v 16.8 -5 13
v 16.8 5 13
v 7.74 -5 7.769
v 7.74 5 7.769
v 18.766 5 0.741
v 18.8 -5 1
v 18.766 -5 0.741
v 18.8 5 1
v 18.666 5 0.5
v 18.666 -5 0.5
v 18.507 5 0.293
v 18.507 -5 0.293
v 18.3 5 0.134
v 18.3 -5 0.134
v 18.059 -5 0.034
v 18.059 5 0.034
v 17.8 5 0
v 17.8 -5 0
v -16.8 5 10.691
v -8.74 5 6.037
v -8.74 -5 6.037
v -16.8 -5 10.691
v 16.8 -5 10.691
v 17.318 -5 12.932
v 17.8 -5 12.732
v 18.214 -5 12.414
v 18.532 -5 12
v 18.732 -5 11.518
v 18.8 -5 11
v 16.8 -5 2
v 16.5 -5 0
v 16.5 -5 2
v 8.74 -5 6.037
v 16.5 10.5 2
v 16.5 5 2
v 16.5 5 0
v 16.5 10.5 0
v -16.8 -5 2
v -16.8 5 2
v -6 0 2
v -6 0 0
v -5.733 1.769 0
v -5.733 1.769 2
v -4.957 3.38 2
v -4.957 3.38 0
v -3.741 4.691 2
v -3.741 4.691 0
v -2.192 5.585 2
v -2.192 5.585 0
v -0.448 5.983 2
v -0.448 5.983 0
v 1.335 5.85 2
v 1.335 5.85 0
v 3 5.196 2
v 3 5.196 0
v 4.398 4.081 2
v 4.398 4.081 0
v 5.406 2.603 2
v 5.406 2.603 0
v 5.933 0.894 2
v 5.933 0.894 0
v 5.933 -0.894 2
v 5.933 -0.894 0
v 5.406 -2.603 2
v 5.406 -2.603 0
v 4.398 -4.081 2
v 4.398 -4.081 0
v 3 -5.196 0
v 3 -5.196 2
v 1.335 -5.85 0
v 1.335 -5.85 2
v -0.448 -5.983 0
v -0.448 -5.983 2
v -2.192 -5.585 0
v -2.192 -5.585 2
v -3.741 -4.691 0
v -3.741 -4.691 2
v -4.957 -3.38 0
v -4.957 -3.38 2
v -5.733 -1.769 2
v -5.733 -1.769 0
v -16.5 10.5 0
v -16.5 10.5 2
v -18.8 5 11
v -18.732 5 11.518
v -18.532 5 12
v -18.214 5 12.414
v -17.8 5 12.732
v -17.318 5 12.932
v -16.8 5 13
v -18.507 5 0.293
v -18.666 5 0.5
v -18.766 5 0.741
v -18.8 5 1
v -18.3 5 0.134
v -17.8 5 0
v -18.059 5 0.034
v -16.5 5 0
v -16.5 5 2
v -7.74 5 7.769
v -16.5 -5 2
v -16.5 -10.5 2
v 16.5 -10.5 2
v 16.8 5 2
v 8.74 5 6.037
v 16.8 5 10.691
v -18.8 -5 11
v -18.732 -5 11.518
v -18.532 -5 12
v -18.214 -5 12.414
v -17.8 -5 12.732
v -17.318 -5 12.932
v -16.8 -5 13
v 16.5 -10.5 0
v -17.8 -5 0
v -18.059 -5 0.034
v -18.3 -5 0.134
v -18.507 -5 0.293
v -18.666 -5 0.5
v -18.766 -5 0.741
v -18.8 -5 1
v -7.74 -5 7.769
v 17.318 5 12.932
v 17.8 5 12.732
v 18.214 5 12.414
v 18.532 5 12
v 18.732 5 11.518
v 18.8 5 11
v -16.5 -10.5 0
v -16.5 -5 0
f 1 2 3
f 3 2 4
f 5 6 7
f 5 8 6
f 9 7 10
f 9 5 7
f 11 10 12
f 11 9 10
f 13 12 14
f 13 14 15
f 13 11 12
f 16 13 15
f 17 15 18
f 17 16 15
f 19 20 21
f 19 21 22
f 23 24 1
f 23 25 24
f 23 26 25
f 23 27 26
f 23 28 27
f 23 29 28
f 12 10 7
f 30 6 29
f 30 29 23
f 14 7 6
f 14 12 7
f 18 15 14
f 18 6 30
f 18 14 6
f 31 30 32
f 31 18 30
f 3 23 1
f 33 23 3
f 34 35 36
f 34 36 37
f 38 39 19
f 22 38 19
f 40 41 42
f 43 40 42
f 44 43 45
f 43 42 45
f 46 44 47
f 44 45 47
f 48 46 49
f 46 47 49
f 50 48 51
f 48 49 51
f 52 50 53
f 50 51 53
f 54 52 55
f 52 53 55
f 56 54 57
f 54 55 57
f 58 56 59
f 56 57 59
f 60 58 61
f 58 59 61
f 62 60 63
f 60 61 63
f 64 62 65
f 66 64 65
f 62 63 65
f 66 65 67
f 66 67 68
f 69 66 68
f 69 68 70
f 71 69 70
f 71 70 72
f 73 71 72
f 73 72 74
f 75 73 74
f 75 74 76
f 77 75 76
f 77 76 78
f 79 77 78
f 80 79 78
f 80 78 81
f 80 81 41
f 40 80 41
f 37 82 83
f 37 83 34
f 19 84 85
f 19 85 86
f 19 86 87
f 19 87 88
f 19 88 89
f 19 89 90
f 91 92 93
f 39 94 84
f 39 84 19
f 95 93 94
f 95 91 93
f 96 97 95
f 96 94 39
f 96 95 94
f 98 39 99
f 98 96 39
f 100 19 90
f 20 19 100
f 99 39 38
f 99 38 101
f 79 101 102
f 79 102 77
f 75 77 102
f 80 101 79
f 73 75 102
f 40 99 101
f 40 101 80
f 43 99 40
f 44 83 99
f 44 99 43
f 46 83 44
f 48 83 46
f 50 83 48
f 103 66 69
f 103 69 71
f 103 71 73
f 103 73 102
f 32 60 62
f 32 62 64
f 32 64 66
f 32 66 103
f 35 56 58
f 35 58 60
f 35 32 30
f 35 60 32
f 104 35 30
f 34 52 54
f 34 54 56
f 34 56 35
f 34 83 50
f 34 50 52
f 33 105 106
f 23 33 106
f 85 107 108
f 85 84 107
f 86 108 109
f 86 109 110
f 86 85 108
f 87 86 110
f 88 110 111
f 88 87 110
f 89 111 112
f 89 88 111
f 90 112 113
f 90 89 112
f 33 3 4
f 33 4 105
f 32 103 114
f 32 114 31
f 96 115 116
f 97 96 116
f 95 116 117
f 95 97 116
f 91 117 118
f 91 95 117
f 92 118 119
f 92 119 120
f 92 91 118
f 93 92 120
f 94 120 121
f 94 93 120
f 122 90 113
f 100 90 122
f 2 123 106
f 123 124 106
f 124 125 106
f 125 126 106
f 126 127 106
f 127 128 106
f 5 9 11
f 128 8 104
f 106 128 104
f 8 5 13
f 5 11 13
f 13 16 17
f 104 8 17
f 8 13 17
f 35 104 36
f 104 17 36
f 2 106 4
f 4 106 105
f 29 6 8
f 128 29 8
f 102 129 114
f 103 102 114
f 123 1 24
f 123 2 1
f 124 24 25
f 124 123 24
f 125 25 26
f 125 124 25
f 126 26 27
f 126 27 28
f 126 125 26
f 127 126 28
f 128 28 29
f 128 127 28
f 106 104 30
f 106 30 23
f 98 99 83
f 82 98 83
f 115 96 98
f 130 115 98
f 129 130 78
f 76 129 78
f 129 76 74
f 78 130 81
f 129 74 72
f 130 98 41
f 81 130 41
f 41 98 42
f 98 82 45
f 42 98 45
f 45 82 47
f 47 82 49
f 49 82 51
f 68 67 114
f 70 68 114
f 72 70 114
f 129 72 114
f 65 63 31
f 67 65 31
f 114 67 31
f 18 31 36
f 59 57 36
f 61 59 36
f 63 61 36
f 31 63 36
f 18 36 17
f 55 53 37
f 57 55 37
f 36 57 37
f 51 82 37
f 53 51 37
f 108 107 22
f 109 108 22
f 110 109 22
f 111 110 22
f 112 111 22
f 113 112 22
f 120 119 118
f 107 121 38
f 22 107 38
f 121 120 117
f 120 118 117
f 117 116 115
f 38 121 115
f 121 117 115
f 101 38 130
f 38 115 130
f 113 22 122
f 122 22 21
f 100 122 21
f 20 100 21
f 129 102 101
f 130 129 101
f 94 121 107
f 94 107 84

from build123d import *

# Parameters (mm, degrees)
SKETCH_1_W          = 37.6
SKETCH_1_H          = 21
EXTRUDE_1_DEPTH     = 2
SKETCH_2_W          = 2.3
SKETCH_2_H          = 5.5
CUT_EXTRUDE_1_DEPTH = 22.626141588
SKETCH_4_W          = 13
SKETCH_4_H          = 10
EXTRUDE_2_DEPTH     = 2
EXTRUDE_4_DEPTH     = 10
SKETCH_6_R          = 6
CUT_EXTRUDE_2_DEPTH = 26.153329799
FILLET_1_R          = 2
FILLET_2_R          = 1


with BuildPart() as part:
    # 草图1 → 凸台-拉伸1 (new body)
    with BuildSketch(Plane.XY):
        Rectangle(SKETCH_1_W, SKETCH_1_H)
    extrude(amount=EXTRUDE_1_DEPTH)

    # 草图2 → 切除-拉伸1 (cut, through all)
    with BuildSketch(Plane.XY.offset(2)):
        with Locations((-17.65, 7.75)):
            Rectangle(SKETCH_2_W, SKETCH_2_H)
        with Locations((17.65, 7.75)):
            Rectangle(SKETCH_2_W, SKETCH_2_H)
        with Locations((-17.65, -7.75)):
            Rectangle(SKETCH_2_W, SKETCH_2_H)
        with Locations((17.65, -7.75)):
            Rectangle(SKETCH_2_W, SKETCH_2_H)
    extrude(amount=-CUT_EXTRUDE_1_DEPTH, mode=Mode.SUBTRACT)

    # 草图4 → 凸台-拉伸2 (add)
    with BuildSketch(Plane.ZY.offset(18.8)):
        with Locations((6.5, 0)):
            Rectangle(SKETCH_4_W, SKETCH_4_H)
    extrude_2 = extrude(amount=-EXTRUDE_2_DEPTH)

    # 草图5 → 凸台-拉伸4 (add)
    with BuildSketch(Plane(origin=(0, 5, 0), x_dir=(1, 0, 0), z_dir=(0, 1, 0))):
        Polygon((-8.740415593, -6.037395696), (-16.8, -10.690598923), (-16.8, -13), (-7.740415593, -7.769446504), align=None)
    extrude_4 = extrude(amount=-EXTRUDE_4_DEPTH)

    # 草图6 → 切除-拉伸2 (cut, through all)
    with BuildSketch(Plane(origin=(0, 0, 0), x_dir=(-1, 0, 0), z_dir=(0, 0, -1))):
        Circle(SKETCH_6_R)
    extrude(amount=-CUT_EXTRUDE_2_DEPTH, mode=Mode.SUBTRACT)

    # 镜向2: 凸台-拉伸2 across plane
    add(extrude_2.mirror(Plane(origin=(0, 0, 0), x_dir=(0, 0, 1), z_dir=(1, 0, 0))))

    # 镜向3: 凸台-拉伸4 across plane
    add(extrude_4.mirror(Plane(origin=(0, 0, 0), x_dir=(0, 0, 1), z_dir=(1, 0, 0))))

    # 圆角1
    fillet_1_edges = [part.edges().sort_by_distance(p)[0] for p in [
        (18.8, 0, 13),
        (-18.8, 0, 13),
    ]]
    fillet(fillet_1_edges, radius=FILLET_1_R - 0.0001)  # a hair under: the kernel refuses the full size

    # 圆角2
    fillet_2_edges = [part.edges().sort_by_distance(p)[0] for p in [
        (-18.8, 0, 0),
        (18.8, 0, 0),
    ]]
    fillet(fillet_2_edges, radius=FILLET_2_R)


solid = part.part
